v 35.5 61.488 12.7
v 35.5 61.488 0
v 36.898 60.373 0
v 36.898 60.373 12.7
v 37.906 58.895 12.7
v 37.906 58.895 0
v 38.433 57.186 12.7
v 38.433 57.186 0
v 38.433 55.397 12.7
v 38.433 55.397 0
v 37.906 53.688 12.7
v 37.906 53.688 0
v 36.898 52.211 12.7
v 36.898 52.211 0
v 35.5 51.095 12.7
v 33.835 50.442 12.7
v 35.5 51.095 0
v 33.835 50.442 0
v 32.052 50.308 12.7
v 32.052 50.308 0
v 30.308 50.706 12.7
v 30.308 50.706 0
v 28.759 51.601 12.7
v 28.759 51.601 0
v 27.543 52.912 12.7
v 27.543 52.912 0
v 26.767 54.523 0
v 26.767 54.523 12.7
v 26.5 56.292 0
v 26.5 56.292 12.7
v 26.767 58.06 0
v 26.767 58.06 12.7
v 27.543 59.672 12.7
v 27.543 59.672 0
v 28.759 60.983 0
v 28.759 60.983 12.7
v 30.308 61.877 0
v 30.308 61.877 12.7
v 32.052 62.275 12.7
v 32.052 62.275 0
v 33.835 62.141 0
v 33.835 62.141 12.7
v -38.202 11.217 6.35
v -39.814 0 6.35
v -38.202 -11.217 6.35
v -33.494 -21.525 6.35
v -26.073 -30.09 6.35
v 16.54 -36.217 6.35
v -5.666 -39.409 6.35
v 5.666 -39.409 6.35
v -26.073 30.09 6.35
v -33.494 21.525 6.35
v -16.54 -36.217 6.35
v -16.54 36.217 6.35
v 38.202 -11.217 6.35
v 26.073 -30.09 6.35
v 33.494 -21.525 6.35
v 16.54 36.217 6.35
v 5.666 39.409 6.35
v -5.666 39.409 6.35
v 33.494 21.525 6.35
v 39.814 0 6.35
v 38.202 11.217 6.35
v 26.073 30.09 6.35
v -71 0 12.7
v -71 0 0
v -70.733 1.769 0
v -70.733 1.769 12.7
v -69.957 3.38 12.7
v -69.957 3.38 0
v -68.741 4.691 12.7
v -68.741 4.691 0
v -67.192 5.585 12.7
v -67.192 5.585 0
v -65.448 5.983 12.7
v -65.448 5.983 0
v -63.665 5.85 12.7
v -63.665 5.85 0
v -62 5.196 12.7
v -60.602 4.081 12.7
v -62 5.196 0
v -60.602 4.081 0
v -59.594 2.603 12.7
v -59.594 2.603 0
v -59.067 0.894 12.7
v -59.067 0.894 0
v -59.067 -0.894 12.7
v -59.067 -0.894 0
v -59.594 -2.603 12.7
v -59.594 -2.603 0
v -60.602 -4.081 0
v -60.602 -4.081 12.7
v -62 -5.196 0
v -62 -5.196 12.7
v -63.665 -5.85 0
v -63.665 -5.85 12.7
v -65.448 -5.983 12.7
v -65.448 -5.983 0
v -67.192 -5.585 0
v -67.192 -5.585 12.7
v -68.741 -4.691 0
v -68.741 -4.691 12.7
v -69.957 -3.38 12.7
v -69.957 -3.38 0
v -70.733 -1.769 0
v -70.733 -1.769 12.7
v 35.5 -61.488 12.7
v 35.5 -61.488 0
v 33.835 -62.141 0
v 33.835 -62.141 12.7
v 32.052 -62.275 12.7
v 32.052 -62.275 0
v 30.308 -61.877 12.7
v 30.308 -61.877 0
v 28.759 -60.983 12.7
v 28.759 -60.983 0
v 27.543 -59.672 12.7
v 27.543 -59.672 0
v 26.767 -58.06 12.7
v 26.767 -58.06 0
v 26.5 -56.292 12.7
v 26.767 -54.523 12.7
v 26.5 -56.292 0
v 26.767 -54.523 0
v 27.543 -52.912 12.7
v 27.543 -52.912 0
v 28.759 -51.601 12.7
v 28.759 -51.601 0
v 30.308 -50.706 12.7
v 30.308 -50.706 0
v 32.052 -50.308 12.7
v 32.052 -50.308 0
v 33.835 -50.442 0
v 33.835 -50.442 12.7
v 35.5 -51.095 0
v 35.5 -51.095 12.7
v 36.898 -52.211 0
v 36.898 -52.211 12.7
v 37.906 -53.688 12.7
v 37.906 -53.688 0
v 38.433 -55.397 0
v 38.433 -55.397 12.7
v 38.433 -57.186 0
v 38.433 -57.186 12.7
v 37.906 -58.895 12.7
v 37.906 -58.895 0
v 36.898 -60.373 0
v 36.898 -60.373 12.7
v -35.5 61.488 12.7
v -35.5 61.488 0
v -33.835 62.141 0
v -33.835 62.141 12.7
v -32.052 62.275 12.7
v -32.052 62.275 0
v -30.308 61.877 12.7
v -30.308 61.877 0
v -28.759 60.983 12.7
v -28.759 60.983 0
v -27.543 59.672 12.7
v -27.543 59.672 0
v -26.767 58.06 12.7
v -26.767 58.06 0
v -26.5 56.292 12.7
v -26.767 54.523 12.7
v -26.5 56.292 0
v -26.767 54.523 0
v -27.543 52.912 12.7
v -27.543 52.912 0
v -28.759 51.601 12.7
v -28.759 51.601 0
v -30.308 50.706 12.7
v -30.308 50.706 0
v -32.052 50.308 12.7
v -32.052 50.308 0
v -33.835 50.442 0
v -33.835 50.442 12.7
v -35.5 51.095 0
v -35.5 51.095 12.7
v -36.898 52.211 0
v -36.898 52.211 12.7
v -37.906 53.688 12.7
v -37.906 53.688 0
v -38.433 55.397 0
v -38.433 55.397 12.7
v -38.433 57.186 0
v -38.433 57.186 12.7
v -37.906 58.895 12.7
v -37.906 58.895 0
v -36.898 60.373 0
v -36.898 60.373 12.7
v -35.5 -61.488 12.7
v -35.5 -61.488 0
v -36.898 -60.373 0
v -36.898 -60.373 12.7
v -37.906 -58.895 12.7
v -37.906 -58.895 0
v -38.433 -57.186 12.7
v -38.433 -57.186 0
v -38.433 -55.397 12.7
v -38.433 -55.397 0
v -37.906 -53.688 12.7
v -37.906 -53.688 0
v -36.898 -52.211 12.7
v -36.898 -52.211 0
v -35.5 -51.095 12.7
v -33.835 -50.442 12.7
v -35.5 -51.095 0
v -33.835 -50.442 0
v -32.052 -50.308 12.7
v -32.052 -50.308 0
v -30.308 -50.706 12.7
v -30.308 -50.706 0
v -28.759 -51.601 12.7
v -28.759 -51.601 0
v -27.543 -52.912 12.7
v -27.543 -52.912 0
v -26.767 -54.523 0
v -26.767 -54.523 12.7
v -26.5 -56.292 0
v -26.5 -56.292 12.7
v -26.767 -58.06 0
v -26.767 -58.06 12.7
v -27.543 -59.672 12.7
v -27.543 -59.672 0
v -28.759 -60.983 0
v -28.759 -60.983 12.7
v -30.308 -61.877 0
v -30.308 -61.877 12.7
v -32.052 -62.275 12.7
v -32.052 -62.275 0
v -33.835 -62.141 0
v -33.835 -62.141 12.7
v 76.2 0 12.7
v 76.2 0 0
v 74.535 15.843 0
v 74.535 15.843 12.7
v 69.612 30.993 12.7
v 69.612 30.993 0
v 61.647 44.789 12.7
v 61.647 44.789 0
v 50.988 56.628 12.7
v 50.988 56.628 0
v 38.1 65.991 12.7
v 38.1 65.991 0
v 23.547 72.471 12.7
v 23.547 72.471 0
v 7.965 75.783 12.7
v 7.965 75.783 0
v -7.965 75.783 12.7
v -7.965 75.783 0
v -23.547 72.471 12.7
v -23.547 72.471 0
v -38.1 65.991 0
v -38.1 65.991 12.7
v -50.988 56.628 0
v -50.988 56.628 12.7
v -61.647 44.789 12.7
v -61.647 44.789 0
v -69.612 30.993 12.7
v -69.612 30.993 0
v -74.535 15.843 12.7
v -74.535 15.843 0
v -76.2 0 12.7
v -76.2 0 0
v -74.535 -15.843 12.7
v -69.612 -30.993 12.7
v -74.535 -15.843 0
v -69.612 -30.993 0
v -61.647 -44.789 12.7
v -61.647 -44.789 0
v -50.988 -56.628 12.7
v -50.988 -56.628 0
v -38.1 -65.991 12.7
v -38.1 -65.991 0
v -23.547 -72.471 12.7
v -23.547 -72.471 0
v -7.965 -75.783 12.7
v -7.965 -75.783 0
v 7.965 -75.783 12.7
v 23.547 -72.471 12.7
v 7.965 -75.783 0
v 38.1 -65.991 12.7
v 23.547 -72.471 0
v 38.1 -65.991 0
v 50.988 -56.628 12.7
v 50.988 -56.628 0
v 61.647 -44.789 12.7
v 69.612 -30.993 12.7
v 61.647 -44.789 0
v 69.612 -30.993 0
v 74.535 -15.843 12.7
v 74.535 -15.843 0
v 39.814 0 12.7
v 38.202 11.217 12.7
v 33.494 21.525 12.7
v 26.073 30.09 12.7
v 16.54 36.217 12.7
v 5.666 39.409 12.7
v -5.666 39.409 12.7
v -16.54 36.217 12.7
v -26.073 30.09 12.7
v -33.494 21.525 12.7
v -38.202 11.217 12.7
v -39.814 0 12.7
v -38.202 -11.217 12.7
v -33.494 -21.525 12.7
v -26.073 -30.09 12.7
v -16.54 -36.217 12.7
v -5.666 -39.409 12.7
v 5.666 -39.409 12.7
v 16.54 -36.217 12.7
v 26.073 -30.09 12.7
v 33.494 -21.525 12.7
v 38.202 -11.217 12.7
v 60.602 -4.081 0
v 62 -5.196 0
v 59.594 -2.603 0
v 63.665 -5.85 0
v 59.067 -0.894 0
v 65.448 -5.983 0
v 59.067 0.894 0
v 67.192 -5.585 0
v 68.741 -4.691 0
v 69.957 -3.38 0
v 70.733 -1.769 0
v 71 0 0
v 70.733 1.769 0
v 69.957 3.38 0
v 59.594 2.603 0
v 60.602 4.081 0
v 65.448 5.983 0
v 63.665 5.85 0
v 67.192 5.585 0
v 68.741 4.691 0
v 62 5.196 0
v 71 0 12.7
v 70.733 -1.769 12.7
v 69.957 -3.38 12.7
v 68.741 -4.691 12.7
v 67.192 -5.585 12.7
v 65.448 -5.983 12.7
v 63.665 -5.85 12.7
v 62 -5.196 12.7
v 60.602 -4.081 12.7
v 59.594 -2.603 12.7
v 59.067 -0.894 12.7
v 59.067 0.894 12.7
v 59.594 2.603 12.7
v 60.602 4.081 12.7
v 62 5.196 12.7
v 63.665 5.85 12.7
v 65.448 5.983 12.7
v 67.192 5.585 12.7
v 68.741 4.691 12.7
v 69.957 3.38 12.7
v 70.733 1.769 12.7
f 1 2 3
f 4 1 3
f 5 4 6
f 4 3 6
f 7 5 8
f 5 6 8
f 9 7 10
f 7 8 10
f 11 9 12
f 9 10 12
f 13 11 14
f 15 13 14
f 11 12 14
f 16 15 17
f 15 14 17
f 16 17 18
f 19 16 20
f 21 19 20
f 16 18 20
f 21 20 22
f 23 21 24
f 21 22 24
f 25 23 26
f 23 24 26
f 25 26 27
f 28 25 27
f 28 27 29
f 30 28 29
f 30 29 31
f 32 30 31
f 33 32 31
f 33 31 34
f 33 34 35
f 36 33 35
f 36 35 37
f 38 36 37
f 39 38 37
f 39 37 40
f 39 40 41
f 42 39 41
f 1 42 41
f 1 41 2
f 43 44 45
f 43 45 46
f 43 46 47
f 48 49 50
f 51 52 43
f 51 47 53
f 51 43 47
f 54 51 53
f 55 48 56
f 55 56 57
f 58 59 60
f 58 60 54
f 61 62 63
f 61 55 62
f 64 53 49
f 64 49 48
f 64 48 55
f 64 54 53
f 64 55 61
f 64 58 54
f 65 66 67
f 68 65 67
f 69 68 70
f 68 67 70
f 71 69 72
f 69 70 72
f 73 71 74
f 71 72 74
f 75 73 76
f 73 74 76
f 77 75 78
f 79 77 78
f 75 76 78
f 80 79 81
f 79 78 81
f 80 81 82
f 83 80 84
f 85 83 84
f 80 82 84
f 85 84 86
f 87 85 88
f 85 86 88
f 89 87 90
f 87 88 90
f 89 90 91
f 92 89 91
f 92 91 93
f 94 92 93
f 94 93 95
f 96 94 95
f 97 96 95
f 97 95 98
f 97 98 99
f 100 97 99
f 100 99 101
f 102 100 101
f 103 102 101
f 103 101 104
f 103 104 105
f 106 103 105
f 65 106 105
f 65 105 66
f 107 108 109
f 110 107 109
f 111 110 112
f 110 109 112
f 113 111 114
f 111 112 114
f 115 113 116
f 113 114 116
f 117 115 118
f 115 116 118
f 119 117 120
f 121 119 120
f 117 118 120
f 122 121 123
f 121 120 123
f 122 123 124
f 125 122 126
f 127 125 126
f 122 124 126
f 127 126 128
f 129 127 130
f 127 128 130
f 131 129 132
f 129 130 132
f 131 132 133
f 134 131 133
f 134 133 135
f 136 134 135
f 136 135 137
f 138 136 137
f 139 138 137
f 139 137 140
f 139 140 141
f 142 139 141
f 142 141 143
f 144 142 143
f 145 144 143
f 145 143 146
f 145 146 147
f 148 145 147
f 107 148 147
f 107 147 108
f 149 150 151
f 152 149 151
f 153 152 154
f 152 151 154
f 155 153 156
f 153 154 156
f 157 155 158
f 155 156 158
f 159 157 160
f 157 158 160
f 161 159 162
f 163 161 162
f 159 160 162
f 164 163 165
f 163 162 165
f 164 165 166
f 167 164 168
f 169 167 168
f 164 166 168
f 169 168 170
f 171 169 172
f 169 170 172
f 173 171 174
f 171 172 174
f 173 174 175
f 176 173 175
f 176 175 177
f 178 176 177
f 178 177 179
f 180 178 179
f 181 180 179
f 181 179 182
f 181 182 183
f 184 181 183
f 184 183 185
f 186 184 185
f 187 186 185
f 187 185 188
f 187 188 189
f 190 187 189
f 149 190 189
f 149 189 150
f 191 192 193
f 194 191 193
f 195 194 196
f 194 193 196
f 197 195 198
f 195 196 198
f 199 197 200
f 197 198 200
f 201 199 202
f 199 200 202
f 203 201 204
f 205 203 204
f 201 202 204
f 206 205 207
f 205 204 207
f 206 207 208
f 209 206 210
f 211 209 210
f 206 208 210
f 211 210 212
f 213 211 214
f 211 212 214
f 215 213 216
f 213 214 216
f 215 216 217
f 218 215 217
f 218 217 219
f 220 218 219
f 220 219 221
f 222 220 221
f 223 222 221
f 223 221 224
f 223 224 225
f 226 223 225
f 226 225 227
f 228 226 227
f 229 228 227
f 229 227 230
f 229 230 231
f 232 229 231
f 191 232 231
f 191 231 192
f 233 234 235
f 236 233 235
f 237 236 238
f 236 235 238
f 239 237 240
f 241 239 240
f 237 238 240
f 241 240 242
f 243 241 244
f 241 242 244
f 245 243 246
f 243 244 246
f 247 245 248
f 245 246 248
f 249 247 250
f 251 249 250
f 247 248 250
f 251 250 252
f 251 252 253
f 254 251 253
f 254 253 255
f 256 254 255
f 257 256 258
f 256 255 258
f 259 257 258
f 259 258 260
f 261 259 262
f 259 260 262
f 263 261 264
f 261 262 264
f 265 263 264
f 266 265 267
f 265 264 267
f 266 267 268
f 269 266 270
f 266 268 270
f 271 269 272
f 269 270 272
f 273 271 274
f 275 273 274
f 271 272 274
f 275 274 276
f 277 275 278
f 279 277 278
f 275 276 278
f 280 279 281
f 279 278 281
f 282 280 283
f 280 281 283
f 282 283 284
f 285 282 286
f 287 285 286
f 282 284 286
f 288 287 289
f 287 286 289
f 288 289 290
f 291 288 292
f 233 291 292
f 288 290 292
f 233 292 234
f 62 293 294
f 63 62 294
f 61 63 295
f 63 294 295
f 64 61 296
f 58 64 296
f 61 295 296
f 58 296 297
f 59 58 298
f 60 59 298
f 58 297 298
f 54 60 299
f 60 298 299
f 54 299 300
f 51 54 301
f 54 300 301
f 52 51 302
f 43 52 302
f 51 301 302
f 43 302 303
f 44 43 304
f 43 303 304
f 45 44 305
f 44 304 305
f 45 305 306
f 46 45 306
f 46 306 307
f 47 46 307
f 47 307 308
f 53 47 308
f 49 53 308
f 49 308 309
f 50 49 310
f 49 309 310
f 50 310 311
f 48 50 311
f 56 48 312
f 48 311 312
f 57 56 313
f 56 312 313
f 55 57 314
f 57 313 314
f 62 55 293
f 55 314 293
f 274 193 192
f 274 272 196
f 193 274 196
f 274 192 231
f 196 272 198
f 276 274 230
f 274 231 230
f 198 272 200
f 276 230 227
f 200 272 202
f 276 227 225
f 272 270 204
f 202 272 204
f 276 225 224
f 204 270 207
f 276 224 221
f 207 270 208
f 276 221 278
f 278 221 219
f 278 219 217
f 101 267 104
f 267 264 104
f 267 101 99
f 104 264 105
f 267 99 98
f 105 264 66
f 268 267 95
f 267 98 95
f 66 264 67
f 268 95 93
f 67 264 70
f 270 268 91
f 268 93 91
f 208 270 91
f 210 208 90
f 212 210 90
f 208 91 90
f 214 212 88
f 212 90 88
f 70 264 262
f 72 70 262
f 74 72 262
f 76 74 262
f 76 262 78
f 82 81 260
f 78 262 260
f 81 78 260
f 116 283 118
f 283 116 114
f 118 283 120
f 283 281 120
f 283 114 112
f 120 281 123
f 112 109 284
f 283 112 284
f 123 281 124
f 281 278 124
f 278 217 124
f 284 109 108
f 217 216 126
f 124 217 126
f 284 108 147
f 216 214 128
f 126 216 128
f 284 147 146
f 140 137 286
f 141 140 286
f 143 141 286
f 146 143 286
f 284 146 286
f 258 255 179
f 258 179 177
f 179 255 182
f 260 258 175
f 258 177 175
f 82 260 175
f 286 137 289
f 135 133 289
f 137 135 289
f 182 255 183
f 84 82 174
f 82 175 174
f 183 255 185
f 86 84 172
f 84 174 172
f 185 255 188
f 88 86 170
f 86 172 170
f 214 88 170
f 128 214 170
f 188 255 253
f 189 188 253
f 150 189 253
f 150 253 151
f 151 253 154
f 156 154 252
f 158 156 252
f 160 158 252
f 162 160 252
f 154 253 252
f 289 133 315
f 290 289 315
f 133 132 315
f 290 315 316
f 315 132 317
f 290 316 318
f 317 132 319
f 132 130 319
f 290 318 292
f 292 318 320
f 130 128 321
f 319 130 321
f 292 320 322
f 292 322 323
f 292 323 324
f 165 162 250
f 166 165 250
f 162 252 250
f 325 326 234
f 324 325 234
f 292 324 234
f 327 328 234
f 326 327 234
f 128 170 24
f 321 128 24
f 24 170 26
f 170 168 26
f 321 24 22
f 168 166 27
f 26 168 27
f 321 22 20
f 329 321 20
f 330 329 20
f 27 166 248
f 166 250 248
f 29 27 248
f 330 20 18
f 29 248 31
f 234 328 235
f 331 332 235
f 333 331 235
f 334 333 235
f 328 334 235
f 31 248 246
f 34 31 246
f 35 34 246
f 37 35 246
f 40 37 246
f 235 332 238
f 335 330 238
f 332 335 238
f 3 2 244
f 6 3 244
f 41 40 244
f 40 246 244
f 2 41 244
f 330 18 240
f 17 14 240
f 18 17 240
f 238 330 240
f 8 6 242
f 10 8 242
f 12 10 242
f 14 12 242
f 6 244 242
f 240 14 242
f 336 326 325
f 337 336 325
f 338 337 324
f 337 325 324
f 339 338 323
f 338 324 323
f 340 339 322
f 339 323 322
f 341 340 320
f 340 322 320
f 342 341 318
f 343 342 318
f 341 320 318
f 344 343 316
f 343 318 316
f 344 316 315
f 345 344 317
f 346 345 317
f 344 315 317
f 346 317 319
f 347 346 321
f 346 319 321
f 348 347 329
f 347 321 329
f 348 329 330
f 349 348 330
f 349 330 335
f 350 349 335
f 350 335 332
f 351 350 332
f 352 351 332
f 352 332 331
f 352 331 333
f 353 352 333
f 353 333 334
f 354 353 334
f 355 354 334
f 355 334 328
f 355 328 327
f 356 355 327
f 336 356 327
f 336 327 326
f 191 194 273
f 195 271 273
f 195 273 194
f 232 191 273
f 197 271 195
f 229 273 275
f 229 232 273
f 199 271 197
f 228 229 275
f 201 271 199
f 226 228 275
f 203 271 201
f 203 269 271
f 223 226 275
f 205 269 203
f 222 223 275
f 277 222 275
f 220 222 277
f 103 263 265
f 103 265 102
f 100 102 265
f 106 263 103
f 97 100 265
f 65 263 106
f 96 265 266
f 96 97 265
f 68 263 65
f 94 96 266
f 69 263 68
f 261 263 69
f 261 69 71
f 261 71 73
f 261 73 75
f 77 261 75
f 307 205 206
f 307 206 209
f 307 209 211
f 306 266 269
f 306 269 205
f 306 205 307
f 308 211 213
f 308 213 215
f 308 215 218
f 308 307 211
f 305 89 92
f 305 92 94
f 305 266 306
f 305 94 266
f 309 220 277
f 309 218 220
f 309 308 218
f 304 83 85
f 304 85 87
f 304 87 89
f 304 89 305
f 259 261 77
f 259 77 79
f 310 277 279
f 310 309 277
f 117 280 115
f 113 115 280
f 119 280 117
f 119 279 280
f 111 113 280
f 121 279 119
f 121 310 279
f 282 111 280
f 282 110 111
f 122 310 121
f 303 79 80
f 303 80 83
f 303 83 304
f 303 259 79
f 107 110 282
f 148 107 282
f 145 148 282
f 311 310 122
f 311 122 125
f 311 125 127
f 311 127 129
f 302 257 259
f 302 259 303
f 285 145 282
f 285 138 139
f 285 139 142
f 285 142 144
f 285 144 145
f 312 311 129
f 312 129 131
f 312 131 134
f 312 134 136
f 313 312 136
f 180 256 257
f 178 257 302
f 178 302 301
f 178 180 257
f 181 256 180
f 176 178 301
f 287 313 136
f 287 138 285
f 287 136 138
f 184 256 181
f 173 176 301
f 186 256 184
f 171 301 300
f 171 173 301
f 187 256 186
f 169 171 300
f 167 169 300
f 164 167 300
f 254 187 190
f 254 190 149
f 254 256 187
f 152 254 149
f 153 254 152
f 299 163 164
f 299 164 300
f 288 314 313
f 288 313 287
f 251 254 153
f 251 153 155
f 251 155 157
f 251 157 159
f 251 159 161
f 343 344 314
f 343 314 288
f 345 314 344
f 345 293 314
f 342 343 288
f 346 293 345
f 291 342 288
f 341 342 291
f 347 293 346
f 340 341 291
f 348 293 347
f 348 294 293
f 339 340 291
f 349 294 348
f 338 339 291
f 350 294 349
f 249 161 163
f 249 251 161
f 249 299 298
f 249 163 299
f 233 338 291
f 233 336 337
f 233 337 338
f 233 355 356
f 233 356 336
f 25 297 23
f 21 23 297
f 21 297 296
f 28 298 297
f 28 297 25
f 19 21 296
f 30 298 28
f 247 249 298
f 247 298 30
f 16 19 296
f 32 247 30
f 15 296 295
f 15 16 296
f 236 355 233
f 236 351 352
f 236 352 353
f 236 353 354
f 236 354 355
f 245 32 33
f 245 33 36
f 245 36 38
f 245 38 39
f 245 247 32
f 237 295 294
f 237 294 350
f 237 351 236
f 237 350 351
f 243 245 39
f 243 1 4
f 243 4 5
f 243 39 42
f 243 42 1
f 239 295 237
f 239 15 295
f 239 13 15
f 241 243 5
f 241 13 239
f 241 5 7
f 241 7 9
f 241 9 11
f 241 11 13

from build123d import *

# Parameters (mm, degrees)
F0_R            = 76.2
F1_DEPTH        = 12.7
F3_D            = 12
F3_COPIES_COUNT = 6
F4_R            = 39.8145
F5_DEPTH        = 6.35


# Not quite as in the source:
# - a pattern or mirror of a feature is missing from the dataset's text; its kind, count and spacing are read off the source's solid


with BuildPart() as f1:
    # F0 (on Top) → F1 (new body)
    with BuildSketch(Plane.XY):
        Circle(F0_R)
    extrude(amount=F1_DEPTH)

    # F3 (through all)
    with Locations(Plane.XY.offset(12.7)):
        with Locations((-65, 0)):
            f3 = Hole(F3_D / 2)

    # F3_copies: F3 ×6 about axis
    f3_copies_axis = Axis((0, 0, 0), (0, 0, 1))
    for i in range(1, F3_COPIES_COUNT):
        add(f3.rotate(f3_copies_axis, i * 360 / F3_COPIES_COUNT), mode=Mode.SUBTRACT)

    # F4 (on face) → F5 (cut)
    with BuildSketch(Plane.XY.offset(12.7)):
        Circle(F4_R)
    extrude(amount=-F5_DEPTH, mode=Mode.SUBTRACT)


solid = f1.part
